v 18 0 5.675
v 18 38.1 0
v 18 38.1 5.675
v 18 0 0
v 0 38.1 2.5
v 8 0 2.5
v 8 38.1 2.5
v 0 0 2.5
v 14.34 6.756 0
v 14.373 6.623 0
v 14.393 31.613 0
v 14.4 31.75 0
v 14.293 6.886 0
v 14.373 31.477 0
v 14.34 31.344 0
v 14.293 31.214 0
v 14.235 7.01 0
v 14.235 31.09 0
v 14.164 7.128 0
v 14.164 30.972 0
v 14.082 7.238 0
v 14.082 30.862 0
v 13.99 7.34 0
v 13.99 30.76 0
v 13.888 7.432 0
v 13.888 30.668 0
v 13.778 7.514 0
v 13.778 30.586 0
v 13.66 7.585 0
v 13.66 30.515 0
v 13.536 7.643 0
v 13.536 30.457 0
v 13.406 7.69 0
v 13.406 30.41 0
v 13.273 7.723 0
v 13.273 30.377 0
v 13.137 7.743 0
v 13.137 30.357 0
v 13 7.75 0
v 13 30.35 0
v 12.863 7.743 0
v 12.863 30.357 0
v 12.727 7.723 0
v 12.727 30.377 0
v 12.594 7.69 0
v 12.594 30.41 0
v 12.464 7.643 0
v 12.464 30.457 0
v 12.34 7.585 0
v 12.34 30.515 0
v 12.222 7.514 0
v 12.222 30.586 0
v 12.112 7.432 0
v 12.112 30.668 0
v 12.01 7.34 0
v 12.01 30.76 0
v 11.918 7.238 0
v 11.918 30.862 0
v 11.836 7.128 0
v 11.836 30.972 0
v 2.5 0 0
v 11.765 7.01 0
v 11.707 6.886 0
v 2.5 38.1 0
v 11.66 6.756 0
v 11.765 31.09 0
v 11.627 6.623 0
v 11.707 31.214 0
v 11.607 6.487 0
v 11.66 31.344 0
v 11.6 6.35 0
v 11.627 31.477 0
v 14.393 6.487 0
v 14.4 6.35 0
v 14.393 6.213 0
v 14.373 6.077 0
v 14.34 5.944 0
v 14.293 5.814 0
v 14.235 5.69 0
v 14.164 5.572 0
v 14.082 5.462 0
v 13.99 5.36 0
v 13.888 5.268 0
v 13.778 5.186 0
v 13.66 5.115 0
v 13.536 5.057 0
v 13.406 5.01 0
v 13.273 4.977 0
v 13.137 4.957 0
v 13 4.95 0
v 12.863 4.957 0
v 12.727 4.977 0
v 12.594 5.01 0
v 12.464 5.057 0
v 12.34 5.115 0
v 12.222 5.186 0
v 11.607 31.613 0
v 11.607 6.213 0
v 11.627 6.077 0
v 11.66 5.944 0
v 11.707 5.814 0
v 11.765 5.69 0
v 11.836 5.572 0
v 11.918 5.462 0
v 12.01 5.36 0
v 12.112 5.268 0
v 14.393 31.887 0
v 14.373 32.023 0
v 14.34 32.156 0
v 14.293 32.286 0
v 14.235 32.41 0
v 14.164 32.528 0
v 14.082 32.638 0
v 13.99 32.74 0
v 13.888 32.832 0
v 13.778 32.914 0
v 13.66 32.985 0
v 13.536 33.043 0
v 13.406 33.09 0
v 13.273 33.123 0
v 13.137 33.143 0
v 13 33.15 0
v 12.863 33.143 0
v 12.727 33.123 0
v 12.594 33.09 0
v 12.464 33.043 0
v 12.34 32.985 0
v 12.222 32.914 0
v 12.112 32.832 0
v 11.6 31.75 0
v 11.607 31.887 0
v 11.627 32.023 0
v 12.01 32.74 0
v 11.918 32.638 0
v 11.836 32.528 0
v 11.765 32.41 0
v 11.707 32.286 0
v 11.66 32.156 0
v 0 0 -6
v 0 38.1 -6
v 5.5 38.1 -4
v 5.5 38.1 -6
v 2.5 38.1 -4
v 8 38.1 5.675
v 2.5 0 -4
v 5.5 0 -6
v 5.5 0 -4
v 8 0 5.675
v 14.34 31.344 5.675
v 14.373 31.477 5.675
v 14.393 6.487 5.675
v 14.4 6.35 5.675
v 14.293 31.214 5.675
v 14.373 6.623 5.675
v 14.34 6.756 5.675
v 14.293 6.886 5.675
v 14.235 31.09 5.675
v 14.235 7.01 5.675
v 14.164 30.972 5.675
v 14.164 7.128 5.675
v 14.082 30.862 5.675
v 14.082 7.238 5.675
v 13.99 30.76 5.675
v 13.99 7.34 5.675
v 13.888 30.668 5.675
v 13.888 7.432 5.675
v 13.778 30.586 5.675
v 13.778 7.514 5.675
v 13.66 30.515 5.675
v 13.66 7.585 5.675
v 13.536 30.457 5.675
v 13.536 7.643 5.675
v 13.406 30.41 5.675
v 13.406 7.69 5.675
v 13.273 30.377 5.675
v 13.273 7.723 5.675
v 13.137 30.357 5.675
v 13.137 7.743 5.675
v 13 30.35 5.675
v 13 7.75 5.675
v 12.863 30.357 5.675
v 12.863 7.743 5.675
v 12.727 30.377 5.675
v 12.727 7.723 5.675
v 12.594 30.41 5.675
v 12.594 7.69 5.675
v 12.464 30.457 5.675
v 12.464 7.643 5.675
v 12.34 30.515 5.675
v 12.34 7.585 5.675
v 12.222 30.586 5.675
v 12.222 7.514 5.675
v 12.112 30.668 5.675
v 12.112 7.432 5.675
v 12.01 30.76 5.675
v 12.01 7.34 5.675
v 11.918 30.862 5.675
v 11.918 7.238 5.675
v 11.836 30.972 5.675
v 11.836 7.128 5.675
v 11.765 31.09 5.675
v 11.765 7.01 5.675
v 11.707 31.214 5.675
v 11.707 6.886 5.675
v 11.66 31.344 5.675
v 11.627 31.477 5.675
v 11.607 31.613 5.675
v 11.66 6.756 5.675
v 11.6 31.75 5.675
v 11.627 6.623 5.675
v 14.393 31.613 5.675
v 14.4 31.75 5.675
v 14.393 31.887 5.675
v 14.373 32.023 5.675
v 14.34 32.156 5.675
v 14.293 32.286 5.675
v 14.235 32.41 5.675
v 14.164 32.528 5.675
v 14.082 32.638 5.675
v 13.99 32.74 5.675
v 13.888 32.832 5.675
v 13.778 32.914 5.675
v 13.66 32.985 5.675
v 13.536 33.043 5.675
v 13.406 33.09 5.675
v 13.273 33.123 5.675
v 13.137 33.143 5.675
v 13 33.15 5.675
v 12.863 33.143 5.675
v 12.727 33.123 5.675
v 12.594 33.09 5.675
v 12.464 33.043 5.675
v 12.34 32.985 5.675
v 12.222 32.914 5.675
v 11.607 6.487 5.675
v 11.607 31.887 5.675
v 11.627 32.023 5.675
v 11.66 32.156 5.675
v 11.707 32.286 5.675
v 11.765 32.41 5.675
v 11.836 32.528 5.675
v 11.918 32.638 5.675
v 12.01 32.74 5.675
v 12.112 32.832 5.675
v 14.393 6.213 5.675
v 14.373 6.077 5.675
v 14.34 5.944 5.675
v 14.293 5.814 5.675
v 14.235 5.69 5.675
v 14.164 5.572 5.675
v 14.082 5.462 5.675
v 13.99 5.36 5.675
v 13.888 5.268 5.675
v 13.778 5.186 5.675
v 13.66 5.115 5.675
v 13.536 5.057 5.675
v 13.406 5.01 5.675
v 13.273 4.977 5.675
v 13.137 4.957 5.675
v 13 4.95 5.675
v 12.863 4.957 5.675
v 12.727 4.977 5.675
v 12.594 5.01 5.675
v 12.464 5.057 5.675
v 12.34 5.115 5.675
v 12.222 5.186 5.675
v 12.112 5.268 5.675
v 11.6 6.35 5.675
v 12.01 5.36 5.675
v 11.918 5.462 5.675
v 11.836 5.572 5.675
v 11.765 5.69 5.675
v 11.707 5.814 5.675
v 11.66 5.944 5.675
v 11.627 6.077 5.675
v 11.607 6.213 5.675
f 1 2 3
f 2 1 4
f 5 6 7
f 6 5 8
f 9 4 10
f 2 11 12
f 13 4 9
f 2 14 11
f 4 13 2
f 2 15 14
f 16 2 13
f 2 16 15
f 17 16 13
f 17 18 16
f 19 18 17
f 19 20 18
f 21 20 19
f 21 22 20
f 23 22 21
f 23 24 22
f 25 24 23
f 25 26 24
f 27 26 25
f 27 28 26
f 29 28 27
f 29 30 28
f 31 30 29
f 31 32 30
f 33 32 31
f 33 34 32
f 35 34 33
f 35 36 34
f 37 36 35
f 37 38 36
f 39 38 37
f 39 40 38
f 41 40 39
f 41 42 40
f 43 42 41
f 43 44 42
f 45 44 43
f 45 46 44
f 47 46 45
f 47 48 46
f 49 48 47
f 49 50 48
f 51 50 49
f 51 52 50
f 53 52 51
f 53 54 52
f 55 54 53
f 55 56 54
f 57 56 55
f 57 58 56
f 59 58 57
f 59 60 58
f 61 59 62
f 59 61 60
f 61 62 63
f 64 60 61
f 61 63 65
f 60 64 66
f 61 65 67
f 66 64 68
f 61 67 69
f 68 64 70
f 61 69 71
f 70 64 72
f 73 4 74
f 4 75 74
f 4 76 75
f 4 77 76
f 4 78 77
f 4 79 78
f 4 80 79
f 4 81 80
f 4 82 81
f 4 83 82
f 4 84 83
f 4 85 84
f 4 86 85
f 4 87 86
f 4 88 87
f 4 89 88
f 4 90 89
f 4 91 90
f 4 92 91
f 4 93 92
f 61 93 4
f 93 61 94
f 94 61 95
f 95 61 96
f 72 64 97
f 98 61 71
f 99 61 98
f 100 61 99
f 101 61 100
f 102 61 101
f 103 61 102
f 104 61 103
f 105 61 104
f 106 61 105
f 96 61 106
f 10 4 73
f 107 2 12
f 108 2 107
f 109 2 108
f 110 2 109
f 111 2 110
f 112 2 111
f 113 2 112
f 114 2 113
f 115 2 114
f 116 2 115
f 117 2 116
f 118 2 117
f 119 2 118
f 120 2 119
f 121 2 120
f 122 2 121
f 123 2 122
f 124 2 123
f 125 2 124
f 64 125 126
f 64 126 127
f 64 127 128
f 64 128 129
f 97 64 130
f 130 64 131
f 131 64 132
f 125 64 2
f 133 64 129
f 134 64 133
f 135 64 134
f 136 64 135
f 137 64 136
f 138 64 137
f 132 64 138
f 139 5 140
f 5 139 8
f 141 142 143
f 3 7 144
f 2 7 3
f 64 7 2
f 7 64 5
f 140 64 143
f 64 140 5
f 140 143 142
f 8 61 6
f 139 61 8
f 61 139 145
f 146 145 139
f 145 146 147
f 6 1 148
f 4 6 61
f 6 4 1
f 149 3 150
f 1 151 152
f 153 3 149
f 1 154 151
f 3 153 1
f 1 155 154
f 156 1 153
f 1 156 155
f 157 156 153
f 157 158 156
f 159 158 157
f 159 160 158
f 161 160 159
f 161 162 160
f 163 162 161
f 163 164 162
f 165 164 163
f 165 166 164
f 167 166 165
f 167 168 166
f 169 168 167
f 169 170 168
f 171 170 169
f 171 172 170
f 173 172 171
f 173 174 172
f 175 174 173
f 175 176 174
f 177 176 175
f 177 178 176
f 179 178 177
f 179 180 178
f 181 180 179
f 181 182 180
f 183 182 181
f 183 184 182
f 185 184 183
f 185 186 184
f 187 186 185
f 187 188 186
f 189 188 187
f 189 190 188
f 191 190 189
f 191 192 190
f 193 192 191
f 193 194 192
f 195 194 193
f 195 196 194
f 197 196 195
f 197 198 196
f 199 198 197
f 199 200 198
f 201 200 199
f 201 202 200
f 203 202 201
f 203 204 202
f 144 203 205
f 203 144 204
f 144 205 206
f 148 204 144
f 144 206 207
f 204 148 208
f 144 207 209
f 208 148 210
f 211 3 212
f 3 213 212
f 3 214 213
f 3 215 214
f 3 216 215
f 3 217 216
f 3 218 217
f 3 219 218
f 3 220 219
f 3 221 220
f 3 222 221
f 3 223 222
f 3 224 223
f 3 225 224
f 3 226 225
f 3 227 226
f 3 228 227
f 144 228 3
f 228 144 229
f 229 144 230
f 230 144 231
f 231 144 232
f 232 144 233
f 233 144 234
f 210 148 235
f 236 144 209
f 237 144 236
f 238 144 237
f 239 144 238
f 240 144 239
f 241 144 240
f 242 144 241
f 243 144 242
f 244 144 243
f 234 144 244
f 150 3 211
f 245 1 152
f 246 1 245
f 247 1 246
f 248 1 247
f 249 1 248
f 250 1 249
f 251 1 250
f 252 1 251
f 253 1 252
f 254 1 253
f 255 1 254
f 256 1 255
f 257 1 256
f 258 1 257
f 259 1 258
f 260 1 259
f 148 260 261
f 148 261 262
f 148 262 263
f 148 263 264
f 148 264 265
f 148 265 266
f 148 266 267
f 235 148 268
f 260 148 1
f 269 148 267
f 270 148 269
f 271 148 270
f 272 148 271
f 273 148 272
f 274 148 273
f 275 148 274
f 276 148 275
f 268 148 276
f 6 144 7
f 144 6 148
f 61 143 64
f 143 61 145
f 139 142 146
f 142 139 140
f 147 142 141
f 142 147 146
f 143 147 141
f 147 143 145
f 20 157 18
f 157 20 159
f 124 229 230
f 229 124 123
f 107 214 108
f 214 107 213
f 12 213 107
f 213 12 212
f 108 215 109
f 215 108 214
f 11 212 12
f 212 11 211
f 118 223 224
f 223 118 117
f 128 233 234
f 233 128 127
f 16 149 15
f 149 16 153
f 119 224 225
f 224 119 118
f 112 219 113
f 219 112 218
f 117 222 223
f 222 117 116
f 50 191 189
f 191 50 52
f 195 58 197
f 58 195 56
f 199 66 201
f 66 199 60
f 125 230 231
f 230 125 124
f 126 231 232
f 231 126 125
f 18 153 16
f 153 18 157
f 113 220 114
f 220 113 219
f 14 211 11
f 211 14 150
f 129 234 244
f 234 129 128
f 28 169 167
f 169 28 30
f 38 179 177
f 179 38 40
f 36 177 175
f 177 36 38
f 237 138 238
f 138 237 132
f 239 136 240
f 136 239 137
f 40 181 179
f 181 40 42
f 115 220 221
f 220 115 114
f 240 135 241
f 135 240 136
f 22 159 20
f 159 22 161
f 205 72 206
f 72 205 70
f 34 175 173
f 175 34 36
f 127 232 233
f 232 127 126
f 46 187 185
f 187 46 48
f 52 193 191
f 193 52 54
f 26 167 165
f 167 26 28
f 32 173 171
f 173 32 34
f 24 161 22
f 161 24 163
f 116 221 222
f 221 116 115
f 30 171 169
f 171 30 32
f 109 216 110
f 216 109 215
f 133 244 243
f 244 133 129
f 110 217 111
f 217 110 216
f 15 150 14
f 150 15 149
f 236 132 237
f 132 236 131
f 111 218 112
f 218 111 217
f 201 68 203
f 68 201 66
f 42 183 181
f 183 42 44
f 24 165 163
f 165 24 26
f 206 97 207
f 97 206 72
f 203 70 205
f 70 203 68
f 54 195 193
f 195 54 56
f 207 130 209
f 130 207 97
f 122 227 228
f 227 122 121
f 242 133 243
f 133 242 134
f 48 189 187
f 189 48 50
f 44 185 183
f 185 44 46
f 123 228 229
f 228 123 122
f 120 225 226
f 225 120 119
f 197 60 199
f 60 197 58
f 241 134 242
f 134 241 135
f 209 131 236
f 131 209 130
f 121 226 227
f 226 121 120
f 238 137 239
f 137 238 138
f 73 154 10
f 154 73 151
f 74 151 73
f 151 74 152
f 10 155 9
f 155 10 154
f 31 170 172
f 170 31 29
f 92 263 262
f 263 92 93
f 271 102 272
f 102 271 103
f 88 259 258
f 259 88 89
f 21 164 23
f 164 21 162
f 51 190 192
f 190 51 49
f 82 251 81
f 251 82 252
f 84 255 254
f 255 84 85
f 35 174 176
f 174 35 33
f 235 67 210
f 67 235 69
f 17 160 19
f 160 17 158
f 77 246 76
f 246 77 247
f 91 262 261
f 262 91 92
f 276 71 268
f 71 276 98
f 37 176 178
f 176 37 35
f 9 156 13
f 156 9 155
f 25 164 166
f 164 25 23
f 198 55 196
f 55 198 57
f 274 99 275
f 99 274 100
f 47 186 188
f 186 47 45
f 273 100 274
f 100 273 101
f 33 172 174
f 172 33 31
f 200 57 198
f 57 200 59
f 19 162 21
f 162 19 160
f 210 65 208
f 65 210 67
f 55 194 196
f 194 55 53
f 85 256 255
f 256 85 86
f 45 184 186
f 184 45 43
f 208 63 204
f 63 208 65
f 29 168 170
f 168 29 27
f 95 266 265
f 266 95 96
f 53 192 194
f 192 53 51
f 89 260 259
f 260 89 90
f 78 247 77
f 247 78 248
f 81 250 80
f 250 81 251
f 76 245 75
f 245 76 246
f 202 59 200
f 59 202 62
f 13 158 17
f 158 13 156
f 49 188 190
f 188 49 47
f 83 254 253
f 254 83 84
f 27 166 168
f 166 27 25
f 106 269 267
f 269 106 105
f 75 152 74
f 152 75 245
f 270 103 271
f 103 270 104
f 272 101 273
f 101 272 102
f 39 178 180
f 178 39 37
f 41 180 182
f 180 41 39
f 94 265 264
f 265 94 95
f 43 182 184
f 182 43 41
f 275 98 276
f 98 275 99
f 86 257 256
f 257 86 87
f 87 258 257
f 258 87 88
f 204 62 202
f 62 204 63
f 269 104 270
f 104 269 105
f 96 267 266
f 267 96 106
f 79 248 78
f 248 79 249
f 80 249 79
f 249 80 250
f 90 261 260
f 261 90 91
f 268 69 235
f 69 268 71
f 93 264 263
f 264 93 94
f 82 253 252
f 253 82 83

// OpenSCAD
// Catch Latch (Part 15)
// Swapped: 1.5" (38.1mm) Length, 18mm Width

// --- User Parameters ---
hole_spacing = 25.4;       // 1 inch exact spacing
screw_clearance_dia = 2.8; // M2.5 clearance

// Base Rectangular Body
total_width = 18.0;        // 18mm wide
total_height = 38.1;       // 1.5 inches long (tall)
base_thickness = 2.5;

// Thick Section (Front face, right side)
// This is the raised pad the screws go through
thick_width = 10.0;        // Scaled to fit the 18mm total width
thick_extra = 3.175;       // 0.125 inches protrusion
total_thickness = base_thickness + thick_extra;

// Catch Section (Back face, left edge)
catch_depth = 6.0;     // How far back it extends from the base plate
catch_wall_thickness = 2.5; 
catch_lip_width = 3.0; // Overhang hooking inwards (to the right)
catch_lip_thickness = 2.0;

$fn = 64; // High resolution for smooth holes

difference() {
    union() {
        // 1. Base Rectangular Body (The middle layer)
        cube([total_width, total_height, base_thickness]);

        // 2. Thick Section on the FRONT (+Z)
        // Positioned on the right side of the part
        translate([total_width - thick_width, 0, base_thickness])
            cube([thick_width, total_height, thick_extra]);

        // 3. Catch Portion on the BACK (-Z)
        // Positioned on the left edge, extending backwards
        translate([0, 0, -catch_depth])
            cube([catch_wall_thickness, total_height, catch_depth]);

        // 4. Catch Lip (Hooking inwards to the right, towards the chassis)
        translate([catch_wall_thickness, 0, -catch_depth])
            cube([catch_lip_width, total_height, catch_lip_thickness]);
    }

    // --- Screw Holes ---
    // Centered vertically, and centered horizontally within the thick section
    center_x = total_width - (thick_width / 2);
    center_y = total_height / 2;

    // Top Hole
    translate([center_x, center_y + (hole_spacing / 2), -catch_depth - 5])
        cylinder(h = total_thickness + catch_depth + 10, d = screw_clearance_dia);

    // Bottom Hole
    translate([center_x, center_y - (hole_spacing / 2), -catch_depth - 5])
        cylinder(h = total_thickness + catch_depth + 10, d = screw_clearance_dia);
}
